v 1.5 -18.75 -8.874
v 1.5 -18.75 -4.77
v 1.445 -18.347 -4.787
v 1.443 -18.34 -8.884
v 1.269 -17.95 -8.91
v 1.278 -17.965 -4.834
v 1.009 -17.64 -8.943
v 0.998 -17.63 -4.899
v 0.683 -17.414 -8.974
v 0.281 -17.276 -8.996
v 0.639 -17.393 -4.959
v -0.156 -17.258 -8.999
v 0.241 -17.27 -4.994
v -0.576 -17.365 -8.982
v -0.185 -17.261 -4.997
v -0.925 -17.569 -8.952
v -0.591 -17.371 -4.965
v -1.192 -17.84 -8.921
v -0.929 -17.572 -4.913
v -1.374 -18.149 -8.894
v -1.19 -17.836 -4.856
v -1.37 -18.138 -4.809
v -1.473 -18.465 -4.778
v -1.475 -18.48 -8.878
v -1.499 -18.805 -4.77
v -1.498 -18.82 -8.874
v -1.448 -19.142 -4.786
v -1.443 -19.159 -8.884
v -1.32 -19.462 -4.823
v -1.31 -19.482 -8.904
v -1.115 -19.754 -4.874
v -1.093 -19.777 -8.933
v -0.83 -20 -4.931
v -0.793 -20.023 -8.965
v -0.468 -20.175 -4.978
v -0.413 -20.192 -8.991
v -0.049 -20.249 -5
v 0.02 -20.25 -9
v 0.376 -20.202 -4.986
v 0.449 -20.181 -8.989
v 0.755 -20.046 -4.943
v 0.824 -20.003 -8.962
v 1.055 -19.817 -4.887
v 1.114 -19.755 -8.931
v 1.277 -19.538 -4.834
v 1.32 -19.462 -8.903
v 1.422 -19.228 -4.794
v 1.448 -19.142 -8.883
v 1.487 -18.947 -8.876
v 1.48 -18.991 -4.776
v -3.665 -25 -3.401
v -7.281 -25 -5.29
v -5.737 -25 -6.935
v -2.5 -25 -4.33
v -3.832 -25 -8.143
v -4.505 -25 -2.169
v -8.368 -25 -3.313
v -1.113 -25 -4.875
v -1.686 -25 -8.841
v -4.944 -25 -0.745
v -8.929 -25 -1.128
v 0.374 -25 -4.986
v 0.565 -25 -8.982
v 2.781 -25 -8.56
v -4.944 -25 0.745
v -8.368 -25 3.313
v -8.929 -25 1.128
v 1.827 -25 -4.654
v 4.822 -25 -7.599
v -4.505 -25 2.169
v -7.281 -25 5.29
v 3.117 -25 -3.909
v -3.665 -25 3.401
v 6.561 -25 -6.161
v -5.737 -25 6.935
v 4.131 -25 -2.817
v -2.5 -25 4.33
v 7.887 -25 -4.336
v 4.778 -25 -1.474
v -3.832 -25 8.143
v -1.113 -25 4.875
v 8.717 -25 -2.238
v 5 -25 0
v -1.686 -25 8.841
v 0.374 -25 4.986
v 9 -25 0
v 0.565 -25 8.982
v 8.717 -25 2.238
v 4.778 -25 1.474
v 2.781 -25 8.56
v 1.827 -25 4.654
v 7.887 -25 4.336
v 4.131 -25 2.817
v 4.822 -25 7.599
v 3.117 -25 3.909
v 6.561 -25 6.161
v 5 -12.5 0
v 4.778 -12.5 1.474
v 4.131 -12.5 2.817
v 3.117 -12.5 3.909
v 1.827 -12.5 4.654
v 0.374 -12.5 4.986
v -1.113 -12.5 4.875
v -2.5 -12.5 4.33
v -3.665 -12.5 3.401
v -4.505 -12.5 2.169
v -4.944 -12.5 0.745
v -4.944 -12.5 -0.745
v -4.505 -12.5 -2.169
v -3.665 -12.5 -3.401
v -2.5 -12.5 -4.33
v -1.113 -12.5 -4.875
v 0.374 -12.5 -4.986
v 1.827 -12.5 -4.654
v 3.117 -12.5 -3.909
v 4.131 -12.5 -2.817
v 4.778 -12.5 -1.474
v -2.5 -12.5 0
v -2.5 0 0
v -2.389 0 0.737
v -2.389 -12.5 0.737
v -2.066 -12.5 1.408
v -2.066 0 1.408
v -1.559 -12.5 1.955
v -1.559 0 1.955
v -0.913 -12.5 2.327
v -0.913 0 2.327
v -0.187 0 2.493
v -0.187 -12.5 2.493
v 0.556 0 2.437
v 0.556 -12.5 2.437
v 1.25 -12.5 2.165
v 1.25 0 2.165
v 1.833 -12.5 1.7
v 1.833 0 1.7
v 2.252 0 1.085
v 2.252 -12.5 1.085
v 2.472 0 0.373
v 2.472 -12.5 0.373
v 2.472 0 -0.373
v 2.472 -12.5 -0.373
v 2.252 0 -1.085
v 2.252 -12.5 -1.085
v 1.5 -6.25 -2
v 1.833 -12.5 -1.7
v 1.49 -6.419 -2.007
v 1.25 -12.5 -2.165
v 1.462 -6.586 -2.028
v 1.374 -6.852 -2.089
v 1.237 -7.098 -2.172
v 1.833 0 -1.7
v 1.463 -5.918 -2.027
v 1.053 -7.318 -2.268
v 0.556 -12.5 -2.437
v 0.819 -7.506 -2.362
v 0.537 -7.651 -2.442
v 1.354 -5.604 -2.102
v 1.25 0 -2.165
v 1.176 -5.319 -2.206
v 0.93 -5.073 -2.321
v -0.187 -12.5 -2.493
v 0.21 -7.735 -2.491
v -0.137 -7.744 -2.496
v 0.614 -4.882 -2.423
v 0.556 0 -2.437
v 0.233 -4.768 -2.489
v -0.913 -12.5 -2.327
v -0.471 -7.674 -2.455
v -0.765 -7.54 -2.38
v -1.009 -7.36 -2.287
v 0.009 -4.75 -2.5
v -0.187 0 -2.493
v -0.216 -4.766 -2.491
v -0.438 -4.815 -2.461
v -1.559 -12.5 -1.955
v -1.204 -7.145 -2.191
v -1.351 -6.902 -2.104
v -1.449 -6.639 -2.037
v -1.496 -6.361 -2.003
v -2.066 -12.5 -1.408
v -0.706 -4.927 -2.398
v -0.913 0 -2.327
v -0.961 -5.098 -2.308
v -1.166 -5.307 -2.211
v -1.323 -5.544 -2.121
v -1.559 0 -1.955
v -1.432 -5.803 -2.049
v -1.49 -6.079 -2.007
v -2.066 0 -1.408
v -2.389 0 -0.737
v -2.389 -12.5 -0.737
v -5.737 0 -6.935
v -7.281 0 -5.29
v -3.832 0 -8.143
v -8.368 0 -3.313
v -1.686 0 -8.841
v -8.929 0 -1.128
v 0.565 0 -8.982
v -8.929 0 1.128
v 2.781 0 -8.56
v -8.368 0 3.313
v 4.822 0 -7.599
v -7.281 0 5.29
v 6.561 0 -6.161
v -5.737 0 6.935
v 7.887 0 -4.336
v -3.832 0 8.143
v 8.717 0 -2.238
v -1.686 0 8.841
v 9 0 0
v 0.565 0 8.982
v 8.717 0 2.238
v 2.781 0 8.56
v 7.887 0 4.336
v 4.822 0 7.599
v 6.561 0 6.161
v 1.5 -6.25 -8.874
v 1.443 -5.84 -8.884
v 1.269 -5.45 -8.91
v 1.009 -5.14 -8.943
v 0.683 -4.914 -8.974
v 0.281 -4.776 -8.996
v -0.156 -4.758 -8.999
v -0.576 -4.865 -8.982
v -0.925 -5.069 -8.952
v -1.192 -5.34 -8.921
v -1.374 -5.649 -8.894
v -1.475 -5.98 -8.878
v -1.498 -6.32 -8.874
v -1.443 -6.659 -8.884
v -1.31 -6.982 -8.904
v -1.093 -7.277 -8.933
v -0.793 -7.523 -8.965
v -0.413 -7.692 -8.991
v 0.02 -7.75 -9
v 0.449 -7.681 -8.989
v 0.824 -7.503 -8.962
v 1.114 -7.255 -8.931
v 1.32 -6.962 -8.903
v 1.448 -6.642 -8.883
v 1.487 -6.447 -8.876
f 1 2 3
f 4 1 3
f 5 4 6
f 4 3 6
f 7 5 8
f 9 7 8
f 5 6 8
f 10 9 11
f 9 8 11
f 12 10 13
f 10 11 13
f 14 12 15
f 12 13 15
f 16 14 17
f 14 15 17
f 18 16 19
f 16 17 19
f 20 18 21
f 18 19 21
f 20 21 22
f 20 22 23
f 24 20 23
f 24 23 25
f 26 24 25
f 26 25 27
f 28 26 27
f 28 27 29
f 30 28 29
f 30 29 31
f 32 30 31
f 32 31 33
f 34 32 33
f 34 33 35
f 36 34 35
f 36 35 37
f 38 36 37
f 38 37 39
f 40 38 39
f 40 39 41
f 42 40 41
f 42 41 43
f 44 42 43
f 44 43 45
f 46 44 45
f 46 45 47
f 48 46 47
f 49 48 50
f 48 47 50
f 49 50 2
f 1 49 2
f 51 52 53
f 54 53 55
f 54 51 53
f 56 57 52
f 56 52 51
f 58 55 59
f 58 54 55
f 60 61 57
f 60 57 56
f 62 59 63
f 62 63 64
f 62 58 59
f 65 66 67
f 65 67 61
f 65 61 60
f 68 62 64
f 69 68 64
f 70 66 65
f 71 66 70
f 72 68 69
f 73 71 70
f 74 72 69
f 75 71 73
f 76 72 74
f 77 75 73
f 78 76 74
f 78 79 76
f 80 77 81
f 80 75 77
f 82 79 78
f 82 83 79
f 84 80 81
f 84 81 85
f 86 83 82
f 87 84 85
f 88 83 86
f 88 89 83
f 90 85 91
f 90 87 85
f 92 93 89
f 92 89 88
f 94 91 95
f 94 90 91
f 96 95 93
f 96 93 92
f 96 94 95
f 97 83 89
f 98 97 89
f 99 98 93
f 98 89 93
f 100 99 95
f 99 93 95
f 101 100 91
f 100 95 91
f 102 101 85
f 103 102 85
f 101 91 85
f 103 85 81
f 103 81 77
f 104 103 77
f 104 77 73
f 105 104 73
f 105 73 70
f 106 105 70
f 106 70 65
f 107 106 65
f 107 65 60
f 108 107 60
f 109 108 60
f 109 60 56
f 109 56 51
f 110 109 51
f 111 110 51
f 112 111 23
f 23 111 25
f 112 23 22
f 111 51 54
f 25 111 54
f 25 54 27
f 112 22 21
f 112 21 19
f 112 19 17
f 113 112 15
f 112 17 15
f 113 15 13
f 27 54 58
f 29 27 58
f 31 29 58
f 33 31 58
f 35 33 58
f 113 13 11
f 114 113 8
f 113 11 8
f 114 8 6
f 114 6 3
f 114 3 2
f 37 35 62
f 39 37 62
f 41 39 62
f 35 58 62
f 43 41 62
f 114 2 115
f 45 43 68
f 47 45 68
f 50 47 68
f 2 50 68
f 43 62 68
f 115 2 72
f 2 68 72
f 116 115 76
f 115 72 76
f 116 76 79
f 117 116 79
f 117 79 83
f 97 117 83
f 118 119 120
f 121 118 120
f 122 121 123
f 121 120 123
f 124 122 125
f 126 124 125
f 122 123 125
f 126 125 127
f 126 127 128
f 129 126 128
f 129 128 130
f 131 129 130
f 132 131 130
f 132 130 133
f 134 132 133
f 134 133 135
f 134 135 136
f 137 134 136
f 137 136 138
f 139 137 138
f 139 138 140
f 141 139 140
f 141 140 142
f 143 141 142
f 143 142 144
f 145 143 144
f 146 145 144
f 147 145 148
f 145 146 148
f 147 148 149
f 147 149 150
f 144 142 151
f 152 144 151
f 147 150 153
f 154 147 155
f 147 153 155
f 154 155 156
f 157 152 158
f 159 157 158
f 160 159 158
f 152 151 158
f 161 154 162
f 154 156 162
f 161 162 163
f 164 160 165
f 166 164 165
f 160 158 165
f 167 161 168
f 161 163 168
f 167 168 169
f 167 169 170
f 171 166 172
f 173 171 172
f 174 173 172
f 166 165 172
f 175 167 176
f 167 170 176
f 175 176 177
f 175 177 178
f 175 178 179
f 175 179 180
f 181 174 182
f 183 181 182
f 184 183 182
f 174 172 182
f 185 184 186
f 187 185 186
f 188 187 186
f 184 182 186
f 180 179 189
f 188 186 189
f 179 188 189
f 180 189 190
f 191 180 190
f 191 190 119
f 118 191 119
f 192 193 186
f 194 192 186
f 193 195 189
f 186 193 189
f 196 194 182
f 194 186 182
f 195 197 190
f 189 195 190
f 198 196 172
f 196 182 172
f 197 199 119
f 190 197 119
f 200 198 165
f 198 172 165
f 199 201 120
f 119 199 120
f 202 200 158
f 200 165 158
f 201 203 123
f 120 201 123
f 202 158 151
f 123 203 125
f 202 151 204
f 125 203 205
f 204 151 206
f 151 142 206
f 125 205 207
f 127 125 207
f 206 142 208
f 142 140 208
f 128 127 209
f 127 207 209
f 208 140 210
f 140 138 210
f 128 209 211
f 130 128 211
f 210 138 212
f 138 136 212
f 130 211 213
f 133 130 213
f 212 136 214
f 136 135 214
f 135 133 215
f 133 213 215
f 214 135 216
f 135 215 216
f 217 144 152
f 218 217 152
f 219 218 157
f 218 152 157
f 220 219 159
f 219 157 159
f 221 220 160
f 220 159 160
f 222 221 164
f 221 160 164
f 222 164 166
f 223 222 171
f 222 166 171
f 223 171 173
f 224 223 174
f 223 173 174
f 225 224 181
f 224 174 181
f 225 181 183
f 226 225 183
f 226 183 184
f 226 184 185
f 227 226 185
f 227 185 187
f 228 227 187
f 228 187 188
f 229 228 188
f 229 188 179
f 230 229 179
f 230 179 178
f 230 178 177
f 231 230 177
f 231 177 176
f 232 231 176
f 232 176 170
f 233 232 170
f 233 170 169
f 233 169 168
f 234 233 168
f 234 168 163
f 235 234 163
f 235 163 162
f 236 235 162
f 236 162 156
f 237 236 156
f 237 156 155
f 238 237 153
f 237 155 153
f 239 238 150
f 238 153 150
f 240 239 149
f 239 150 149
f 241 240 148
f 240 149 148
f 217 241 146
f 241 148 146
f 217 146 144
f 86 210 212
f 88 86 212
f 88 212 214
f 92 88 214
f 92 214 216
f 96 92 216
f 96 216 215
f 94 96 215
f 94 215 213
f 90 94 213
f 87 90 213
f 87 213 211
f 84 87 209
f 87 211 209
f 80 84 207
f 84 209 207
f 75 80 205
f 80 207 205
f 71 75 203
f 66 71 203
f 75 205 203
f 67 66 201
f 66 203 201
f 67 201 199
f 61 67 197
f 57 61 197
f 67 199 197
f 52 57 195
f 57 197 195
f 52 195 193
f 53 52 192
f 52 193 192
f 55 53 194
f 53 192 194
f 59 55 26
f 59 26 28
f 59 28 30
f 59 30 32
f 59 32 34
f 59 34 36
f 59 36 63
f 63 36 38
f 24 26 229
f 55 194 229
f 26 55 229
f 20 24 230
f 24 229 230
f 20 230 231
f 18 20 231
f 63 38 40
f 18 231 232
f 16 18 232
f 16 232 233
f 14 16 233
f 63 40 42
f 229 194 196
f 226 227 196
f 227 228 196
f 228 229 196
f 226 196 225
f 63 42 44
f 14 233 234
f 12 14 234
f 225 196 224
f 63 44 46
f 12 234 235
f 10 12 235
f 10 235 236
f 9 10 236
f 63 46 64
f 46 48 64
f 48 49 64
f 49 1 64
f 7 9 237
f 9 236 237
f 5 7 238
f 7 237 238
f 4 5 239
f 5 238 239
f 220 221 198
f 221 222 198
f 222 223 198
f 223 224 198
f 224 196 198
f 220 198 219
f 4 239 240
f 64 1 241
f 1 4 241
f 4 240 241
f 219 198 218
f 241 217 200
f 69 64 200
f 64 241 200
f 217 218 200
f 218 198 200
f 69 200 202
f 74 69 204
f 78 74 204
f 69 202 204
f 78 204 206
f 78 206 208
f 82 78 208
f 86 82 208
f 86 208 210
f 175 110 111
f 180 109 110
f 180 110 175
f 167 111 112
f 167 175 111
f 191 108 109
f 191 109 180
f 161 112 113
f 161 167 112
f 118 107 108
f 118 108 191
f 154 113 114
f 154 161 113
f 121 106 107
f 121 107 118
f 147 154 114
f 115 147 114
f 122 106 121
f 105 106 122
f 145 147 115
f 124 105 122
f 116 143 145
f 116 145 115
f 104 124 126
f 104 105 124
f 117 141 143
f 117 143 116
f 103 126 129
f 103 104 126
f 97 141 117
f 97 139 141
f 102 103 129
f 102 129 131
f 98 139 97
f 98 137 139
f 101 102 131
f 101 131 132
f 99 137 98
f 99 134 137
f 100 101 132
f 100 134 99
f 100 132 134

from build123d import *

# Parameters (mm, degrees)
F0_R     = 9
F1_DEPTH = 25
F2_R     = 5
F3_DEPTH = 12.5
F4_R     = 2.5
F5_DEPTH = 12.5
F6_R     = 1.5
F7_DEPTH = 25


with BuildPart() as f1:
    # F0 (on Front) → F1 (new body)
    with BuildSketch(Plane.XZ):
        Circle(F0_R)
    extrude(amount=F1_DEPTH)

    # F2 (on face) → F3 (cut)
    with BuildSketch(Plane.XZ.offset(25)):
        Circle(F2_R)
    extrude(amount=-F3_DEPTH, mode=Mode.SUBTRACT)

    # F4 (on face) → F5 (cut)
    with BuildSketch(Plane(origin=(0, 0, 0), x_dir=(-1, 0, 0), z_dir=(0, 1, 0))):
        Circle(F4_R)
    extrude(amount=-F5_DEPTH, mode=Mode.SUBTRACT)

    # F6 (on Top) → F7 (cut)
    with BuildSketch(Plane.XY):
        with Locations((0, -6.25)):
            Circle(F6_R)
        with Locations((0, -18.75)):
            Circle(F6_R)
    extrude(amount=-F7_DEPTH, mode=Mode.SUBTRACT)


solid = f1.part
